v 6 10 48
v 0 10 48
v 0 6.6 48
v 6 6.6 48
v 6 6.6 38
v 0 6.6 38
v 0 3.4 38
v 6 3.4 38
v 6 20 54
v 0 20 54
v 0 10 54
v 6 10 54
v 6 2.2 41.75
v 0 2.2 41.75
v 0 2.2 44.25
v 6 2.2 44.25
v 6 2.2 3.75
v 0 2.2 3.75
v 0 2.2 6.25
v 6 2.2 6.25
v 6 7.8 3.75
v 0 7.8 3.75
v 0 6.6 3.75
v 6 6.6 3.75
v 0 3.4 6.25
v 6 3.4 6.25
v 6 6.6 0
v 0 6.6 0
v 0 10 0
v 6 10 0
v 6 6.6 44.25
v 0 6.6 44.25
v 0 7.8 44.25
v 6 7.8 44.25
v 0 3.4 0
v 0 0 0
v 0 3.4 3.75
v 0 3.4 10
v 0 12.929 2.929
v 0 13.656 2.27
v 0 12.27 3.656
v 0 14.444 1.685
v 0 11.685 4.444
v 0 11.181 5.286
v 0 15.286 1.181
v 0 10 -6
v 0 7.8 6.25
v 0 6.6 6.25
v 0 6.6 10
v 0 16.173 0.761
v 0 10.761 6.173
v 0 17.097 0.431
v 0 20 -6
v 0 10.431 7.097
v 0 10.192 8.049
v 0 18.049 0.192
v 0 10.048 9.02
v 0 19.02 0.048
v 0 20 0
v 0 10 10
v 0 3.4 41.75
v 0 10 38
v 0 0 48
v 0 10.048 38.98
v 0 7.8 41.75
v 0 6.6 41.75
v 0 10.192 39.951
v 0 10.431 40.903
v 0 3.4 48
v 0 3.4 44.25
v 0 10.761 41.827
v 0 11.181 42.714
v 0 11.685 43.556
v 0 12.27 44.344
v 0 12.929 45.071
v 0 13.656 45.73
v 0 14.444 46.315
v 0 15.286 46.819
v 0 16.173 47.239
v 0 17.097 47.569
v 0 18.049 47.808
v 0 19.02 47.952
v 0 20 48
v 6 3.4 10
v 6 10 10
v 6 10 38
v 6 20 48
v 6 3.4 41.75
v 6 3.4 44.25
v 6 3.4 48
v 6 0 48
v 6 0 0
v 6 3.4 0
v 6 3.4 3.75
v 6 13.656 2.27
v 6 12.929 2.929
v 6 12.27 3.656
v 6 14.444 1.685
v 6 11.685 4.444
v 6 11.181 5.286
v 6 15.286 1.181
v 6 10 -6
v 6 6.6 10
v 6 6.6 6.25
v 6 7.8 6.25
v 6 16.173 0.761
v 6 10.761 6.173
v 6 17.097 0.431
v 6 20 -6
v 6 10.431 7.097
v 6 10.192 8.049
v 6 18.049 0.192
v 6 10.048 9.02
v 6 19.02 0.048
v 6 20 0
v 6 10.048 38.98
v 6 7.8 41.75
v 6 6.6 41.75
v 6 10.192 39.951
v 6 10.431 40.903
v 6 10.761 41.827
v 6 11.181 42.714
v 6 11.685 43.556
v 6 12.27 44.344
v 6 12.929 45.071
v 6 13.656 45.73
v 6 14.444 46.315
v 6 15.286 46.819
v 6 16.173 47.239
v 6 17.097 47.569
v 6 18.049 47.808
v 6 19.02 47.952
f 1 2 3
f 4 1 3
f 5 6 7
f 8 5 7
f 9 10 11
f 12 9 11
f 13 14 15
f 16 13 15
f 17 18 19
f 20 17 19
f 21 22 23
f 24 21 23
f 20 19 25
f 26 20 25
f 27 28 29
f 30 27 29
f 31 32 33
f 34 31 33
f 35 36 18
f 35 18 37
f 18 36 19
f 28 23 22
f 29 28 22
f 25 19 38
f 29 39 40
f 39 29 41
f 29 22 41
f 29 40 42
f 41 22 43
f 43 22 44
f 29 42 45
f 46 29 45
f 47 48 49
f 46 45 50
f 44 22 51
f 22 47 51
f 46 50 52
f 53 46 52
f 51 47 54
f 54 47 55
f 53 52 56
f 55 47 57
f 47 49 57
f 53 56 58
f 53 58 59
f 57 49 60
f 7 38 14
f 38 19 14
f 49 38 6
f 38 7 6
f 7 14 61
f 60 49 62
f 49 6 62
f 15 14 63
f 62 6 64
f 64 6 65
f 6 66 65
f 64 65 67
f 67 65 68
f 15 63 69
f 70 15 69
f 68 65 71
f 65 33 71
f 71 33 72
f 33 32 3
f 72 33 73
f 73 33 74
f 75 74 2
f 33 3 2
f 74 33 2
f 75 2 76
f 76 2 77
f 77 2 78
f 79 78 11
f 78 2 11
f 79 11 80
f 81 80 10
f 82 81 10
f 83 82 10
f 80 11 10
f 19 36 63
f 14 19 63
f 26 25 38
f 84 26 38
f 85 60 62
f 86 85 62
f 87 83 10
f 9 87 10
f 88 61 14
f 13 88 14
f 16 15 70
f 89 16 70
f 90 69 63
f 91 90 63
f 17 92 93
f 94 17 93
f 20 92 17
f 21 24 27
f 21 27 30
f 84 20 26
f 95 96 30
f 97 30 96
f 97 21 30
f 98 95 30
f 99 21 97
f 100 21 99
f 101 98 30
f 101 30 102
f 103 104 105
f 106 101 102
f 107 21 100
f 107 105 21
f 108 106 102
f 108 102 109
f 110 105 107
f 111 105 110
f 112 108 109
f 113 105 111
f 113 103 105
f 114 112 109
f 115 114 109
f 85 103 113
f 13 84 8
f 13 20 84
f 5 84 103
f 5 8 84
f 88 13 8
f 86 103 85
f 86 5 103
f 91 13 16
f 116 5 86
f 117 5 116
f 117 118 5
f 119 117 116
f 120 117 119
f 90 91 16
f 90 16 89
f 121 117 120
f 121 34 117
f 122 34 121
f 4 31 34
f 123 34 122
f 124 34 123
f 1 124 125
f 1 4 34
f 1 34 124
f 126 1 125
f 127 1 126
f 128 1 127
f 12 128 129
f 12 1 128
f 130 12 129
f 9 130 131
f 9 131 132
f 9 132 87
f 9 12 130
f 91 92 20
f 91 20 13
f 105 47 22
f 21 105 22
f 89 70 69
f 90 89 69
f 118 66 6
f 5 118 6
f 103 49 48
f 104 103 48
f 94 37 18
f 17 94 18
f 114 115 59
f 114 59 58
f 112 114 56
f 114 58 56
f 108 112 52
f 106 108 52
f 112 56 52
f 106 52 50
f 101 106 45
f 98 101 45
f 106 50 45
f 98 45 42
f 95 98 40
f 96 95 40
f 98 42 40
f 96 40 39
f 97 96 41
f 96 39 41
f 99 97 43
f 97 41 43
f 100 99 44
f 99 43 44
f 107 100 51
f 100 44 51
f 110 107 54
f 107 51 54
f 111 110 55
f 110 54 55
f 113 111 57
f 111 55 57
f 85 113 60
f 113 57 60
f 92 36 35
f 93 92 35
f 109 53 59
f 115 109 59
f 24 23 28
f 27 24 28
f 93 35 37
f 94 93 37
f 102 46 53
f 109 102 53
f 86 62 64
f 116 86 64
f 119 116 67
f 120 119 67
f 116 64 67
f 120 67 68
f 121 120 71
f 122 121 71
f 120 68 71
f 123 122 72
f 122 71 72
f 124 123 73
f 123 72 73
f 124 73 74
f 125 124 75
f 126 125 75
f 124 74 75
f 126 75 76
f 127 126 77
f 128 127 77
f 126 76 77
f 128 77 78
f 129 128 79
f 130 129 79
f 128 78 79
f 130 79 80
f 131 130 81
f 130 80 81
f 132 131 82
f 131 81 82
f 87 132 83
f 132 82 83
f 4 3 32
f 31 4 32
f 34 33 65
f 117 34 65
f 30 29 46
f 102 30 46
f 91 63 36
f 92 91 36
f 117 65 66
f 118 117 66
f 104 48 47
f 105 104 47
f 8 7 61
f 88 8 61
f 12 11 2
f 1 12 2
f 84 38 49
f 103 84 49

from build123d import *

# Parameters (mm, degrees)
F1_DEPTH = 6


with BuildPart() as f1:
    # F0 (on Right) → F1 (new body)
    with BuildSketch(Plane.YZ):
        with BuildLine():
            Line((3.4, 48), (0, 48))
            Line((0, 48), (0, 0))
            Line((0, 0), (3.4, 0))
            Line((3.4, 0), (3.4, 3.75))
            Line((3.4, 3.75), (2.2, 3.75))
            Line((2.2, 3.75), (2.2, 6.25))
            Line((2.2, 6.25), (3.4, 6.25))
            Line((3.4, 6.25), (3.4, 10))
            Line((3.4, 10), (5, 10))
            Line((5, 10), (6.6, 10))
            Line((6.6, 10), (6.6, 6.25))
            Line((6.6, 6.25), (7.8, 6.25))
            Line((7.8, 6.25), (7.8, 3.75))
            Line((7.8, 3.75), (6.6, 3.75))
            Line((6.6, 3.75), (6.6, 0))
            Line((6.6, 0), (10, 0))
            Line((10, 0), (10, -6))
            Line((10, -6), (20, -6))
            Line((20, -6), (20, 0))
            ThreePointArc((20, 0), (12.928932, 2.928932), (10, 10))
            Line((10, 10), (10, 38))
            ThreePointArc((10, 38), (12.928932, 45.071068), (20, 48))
            Line((20, 48), (20, 54))
            Line((20, 54), (10, 54))
            Line((10, 54), (10, 48))
            Line((10, 48), (6.6, 48))
            Line((6.6, 48), (6.6, 44.25))
            Line((6.6, 44.25), (7.8, 44.25))
            Line((7.8, 44.25), (7.8, 41.75))
            Line((7.8, 41.75), (6.6, 41.75))
            Line((6.6, 41.75), (6.6, 38))
            Line((6.6, 38), (5, 38))
            Line((5, 38), (3.4, 38))
            Line((3.4, 38), (3.4, 41.75))
            Line((3.4, 41.75), (2.2, 41.75))
            Line((2.2, 41.75), (2.2, 44.25))
            Line((2.2, 44.25), (3.4, 44.25))
            Line((3.4, 44.25), (3.4, 48))
        make_face()
    extrude(amount=F1_DEPTH)


solid = f1.part
